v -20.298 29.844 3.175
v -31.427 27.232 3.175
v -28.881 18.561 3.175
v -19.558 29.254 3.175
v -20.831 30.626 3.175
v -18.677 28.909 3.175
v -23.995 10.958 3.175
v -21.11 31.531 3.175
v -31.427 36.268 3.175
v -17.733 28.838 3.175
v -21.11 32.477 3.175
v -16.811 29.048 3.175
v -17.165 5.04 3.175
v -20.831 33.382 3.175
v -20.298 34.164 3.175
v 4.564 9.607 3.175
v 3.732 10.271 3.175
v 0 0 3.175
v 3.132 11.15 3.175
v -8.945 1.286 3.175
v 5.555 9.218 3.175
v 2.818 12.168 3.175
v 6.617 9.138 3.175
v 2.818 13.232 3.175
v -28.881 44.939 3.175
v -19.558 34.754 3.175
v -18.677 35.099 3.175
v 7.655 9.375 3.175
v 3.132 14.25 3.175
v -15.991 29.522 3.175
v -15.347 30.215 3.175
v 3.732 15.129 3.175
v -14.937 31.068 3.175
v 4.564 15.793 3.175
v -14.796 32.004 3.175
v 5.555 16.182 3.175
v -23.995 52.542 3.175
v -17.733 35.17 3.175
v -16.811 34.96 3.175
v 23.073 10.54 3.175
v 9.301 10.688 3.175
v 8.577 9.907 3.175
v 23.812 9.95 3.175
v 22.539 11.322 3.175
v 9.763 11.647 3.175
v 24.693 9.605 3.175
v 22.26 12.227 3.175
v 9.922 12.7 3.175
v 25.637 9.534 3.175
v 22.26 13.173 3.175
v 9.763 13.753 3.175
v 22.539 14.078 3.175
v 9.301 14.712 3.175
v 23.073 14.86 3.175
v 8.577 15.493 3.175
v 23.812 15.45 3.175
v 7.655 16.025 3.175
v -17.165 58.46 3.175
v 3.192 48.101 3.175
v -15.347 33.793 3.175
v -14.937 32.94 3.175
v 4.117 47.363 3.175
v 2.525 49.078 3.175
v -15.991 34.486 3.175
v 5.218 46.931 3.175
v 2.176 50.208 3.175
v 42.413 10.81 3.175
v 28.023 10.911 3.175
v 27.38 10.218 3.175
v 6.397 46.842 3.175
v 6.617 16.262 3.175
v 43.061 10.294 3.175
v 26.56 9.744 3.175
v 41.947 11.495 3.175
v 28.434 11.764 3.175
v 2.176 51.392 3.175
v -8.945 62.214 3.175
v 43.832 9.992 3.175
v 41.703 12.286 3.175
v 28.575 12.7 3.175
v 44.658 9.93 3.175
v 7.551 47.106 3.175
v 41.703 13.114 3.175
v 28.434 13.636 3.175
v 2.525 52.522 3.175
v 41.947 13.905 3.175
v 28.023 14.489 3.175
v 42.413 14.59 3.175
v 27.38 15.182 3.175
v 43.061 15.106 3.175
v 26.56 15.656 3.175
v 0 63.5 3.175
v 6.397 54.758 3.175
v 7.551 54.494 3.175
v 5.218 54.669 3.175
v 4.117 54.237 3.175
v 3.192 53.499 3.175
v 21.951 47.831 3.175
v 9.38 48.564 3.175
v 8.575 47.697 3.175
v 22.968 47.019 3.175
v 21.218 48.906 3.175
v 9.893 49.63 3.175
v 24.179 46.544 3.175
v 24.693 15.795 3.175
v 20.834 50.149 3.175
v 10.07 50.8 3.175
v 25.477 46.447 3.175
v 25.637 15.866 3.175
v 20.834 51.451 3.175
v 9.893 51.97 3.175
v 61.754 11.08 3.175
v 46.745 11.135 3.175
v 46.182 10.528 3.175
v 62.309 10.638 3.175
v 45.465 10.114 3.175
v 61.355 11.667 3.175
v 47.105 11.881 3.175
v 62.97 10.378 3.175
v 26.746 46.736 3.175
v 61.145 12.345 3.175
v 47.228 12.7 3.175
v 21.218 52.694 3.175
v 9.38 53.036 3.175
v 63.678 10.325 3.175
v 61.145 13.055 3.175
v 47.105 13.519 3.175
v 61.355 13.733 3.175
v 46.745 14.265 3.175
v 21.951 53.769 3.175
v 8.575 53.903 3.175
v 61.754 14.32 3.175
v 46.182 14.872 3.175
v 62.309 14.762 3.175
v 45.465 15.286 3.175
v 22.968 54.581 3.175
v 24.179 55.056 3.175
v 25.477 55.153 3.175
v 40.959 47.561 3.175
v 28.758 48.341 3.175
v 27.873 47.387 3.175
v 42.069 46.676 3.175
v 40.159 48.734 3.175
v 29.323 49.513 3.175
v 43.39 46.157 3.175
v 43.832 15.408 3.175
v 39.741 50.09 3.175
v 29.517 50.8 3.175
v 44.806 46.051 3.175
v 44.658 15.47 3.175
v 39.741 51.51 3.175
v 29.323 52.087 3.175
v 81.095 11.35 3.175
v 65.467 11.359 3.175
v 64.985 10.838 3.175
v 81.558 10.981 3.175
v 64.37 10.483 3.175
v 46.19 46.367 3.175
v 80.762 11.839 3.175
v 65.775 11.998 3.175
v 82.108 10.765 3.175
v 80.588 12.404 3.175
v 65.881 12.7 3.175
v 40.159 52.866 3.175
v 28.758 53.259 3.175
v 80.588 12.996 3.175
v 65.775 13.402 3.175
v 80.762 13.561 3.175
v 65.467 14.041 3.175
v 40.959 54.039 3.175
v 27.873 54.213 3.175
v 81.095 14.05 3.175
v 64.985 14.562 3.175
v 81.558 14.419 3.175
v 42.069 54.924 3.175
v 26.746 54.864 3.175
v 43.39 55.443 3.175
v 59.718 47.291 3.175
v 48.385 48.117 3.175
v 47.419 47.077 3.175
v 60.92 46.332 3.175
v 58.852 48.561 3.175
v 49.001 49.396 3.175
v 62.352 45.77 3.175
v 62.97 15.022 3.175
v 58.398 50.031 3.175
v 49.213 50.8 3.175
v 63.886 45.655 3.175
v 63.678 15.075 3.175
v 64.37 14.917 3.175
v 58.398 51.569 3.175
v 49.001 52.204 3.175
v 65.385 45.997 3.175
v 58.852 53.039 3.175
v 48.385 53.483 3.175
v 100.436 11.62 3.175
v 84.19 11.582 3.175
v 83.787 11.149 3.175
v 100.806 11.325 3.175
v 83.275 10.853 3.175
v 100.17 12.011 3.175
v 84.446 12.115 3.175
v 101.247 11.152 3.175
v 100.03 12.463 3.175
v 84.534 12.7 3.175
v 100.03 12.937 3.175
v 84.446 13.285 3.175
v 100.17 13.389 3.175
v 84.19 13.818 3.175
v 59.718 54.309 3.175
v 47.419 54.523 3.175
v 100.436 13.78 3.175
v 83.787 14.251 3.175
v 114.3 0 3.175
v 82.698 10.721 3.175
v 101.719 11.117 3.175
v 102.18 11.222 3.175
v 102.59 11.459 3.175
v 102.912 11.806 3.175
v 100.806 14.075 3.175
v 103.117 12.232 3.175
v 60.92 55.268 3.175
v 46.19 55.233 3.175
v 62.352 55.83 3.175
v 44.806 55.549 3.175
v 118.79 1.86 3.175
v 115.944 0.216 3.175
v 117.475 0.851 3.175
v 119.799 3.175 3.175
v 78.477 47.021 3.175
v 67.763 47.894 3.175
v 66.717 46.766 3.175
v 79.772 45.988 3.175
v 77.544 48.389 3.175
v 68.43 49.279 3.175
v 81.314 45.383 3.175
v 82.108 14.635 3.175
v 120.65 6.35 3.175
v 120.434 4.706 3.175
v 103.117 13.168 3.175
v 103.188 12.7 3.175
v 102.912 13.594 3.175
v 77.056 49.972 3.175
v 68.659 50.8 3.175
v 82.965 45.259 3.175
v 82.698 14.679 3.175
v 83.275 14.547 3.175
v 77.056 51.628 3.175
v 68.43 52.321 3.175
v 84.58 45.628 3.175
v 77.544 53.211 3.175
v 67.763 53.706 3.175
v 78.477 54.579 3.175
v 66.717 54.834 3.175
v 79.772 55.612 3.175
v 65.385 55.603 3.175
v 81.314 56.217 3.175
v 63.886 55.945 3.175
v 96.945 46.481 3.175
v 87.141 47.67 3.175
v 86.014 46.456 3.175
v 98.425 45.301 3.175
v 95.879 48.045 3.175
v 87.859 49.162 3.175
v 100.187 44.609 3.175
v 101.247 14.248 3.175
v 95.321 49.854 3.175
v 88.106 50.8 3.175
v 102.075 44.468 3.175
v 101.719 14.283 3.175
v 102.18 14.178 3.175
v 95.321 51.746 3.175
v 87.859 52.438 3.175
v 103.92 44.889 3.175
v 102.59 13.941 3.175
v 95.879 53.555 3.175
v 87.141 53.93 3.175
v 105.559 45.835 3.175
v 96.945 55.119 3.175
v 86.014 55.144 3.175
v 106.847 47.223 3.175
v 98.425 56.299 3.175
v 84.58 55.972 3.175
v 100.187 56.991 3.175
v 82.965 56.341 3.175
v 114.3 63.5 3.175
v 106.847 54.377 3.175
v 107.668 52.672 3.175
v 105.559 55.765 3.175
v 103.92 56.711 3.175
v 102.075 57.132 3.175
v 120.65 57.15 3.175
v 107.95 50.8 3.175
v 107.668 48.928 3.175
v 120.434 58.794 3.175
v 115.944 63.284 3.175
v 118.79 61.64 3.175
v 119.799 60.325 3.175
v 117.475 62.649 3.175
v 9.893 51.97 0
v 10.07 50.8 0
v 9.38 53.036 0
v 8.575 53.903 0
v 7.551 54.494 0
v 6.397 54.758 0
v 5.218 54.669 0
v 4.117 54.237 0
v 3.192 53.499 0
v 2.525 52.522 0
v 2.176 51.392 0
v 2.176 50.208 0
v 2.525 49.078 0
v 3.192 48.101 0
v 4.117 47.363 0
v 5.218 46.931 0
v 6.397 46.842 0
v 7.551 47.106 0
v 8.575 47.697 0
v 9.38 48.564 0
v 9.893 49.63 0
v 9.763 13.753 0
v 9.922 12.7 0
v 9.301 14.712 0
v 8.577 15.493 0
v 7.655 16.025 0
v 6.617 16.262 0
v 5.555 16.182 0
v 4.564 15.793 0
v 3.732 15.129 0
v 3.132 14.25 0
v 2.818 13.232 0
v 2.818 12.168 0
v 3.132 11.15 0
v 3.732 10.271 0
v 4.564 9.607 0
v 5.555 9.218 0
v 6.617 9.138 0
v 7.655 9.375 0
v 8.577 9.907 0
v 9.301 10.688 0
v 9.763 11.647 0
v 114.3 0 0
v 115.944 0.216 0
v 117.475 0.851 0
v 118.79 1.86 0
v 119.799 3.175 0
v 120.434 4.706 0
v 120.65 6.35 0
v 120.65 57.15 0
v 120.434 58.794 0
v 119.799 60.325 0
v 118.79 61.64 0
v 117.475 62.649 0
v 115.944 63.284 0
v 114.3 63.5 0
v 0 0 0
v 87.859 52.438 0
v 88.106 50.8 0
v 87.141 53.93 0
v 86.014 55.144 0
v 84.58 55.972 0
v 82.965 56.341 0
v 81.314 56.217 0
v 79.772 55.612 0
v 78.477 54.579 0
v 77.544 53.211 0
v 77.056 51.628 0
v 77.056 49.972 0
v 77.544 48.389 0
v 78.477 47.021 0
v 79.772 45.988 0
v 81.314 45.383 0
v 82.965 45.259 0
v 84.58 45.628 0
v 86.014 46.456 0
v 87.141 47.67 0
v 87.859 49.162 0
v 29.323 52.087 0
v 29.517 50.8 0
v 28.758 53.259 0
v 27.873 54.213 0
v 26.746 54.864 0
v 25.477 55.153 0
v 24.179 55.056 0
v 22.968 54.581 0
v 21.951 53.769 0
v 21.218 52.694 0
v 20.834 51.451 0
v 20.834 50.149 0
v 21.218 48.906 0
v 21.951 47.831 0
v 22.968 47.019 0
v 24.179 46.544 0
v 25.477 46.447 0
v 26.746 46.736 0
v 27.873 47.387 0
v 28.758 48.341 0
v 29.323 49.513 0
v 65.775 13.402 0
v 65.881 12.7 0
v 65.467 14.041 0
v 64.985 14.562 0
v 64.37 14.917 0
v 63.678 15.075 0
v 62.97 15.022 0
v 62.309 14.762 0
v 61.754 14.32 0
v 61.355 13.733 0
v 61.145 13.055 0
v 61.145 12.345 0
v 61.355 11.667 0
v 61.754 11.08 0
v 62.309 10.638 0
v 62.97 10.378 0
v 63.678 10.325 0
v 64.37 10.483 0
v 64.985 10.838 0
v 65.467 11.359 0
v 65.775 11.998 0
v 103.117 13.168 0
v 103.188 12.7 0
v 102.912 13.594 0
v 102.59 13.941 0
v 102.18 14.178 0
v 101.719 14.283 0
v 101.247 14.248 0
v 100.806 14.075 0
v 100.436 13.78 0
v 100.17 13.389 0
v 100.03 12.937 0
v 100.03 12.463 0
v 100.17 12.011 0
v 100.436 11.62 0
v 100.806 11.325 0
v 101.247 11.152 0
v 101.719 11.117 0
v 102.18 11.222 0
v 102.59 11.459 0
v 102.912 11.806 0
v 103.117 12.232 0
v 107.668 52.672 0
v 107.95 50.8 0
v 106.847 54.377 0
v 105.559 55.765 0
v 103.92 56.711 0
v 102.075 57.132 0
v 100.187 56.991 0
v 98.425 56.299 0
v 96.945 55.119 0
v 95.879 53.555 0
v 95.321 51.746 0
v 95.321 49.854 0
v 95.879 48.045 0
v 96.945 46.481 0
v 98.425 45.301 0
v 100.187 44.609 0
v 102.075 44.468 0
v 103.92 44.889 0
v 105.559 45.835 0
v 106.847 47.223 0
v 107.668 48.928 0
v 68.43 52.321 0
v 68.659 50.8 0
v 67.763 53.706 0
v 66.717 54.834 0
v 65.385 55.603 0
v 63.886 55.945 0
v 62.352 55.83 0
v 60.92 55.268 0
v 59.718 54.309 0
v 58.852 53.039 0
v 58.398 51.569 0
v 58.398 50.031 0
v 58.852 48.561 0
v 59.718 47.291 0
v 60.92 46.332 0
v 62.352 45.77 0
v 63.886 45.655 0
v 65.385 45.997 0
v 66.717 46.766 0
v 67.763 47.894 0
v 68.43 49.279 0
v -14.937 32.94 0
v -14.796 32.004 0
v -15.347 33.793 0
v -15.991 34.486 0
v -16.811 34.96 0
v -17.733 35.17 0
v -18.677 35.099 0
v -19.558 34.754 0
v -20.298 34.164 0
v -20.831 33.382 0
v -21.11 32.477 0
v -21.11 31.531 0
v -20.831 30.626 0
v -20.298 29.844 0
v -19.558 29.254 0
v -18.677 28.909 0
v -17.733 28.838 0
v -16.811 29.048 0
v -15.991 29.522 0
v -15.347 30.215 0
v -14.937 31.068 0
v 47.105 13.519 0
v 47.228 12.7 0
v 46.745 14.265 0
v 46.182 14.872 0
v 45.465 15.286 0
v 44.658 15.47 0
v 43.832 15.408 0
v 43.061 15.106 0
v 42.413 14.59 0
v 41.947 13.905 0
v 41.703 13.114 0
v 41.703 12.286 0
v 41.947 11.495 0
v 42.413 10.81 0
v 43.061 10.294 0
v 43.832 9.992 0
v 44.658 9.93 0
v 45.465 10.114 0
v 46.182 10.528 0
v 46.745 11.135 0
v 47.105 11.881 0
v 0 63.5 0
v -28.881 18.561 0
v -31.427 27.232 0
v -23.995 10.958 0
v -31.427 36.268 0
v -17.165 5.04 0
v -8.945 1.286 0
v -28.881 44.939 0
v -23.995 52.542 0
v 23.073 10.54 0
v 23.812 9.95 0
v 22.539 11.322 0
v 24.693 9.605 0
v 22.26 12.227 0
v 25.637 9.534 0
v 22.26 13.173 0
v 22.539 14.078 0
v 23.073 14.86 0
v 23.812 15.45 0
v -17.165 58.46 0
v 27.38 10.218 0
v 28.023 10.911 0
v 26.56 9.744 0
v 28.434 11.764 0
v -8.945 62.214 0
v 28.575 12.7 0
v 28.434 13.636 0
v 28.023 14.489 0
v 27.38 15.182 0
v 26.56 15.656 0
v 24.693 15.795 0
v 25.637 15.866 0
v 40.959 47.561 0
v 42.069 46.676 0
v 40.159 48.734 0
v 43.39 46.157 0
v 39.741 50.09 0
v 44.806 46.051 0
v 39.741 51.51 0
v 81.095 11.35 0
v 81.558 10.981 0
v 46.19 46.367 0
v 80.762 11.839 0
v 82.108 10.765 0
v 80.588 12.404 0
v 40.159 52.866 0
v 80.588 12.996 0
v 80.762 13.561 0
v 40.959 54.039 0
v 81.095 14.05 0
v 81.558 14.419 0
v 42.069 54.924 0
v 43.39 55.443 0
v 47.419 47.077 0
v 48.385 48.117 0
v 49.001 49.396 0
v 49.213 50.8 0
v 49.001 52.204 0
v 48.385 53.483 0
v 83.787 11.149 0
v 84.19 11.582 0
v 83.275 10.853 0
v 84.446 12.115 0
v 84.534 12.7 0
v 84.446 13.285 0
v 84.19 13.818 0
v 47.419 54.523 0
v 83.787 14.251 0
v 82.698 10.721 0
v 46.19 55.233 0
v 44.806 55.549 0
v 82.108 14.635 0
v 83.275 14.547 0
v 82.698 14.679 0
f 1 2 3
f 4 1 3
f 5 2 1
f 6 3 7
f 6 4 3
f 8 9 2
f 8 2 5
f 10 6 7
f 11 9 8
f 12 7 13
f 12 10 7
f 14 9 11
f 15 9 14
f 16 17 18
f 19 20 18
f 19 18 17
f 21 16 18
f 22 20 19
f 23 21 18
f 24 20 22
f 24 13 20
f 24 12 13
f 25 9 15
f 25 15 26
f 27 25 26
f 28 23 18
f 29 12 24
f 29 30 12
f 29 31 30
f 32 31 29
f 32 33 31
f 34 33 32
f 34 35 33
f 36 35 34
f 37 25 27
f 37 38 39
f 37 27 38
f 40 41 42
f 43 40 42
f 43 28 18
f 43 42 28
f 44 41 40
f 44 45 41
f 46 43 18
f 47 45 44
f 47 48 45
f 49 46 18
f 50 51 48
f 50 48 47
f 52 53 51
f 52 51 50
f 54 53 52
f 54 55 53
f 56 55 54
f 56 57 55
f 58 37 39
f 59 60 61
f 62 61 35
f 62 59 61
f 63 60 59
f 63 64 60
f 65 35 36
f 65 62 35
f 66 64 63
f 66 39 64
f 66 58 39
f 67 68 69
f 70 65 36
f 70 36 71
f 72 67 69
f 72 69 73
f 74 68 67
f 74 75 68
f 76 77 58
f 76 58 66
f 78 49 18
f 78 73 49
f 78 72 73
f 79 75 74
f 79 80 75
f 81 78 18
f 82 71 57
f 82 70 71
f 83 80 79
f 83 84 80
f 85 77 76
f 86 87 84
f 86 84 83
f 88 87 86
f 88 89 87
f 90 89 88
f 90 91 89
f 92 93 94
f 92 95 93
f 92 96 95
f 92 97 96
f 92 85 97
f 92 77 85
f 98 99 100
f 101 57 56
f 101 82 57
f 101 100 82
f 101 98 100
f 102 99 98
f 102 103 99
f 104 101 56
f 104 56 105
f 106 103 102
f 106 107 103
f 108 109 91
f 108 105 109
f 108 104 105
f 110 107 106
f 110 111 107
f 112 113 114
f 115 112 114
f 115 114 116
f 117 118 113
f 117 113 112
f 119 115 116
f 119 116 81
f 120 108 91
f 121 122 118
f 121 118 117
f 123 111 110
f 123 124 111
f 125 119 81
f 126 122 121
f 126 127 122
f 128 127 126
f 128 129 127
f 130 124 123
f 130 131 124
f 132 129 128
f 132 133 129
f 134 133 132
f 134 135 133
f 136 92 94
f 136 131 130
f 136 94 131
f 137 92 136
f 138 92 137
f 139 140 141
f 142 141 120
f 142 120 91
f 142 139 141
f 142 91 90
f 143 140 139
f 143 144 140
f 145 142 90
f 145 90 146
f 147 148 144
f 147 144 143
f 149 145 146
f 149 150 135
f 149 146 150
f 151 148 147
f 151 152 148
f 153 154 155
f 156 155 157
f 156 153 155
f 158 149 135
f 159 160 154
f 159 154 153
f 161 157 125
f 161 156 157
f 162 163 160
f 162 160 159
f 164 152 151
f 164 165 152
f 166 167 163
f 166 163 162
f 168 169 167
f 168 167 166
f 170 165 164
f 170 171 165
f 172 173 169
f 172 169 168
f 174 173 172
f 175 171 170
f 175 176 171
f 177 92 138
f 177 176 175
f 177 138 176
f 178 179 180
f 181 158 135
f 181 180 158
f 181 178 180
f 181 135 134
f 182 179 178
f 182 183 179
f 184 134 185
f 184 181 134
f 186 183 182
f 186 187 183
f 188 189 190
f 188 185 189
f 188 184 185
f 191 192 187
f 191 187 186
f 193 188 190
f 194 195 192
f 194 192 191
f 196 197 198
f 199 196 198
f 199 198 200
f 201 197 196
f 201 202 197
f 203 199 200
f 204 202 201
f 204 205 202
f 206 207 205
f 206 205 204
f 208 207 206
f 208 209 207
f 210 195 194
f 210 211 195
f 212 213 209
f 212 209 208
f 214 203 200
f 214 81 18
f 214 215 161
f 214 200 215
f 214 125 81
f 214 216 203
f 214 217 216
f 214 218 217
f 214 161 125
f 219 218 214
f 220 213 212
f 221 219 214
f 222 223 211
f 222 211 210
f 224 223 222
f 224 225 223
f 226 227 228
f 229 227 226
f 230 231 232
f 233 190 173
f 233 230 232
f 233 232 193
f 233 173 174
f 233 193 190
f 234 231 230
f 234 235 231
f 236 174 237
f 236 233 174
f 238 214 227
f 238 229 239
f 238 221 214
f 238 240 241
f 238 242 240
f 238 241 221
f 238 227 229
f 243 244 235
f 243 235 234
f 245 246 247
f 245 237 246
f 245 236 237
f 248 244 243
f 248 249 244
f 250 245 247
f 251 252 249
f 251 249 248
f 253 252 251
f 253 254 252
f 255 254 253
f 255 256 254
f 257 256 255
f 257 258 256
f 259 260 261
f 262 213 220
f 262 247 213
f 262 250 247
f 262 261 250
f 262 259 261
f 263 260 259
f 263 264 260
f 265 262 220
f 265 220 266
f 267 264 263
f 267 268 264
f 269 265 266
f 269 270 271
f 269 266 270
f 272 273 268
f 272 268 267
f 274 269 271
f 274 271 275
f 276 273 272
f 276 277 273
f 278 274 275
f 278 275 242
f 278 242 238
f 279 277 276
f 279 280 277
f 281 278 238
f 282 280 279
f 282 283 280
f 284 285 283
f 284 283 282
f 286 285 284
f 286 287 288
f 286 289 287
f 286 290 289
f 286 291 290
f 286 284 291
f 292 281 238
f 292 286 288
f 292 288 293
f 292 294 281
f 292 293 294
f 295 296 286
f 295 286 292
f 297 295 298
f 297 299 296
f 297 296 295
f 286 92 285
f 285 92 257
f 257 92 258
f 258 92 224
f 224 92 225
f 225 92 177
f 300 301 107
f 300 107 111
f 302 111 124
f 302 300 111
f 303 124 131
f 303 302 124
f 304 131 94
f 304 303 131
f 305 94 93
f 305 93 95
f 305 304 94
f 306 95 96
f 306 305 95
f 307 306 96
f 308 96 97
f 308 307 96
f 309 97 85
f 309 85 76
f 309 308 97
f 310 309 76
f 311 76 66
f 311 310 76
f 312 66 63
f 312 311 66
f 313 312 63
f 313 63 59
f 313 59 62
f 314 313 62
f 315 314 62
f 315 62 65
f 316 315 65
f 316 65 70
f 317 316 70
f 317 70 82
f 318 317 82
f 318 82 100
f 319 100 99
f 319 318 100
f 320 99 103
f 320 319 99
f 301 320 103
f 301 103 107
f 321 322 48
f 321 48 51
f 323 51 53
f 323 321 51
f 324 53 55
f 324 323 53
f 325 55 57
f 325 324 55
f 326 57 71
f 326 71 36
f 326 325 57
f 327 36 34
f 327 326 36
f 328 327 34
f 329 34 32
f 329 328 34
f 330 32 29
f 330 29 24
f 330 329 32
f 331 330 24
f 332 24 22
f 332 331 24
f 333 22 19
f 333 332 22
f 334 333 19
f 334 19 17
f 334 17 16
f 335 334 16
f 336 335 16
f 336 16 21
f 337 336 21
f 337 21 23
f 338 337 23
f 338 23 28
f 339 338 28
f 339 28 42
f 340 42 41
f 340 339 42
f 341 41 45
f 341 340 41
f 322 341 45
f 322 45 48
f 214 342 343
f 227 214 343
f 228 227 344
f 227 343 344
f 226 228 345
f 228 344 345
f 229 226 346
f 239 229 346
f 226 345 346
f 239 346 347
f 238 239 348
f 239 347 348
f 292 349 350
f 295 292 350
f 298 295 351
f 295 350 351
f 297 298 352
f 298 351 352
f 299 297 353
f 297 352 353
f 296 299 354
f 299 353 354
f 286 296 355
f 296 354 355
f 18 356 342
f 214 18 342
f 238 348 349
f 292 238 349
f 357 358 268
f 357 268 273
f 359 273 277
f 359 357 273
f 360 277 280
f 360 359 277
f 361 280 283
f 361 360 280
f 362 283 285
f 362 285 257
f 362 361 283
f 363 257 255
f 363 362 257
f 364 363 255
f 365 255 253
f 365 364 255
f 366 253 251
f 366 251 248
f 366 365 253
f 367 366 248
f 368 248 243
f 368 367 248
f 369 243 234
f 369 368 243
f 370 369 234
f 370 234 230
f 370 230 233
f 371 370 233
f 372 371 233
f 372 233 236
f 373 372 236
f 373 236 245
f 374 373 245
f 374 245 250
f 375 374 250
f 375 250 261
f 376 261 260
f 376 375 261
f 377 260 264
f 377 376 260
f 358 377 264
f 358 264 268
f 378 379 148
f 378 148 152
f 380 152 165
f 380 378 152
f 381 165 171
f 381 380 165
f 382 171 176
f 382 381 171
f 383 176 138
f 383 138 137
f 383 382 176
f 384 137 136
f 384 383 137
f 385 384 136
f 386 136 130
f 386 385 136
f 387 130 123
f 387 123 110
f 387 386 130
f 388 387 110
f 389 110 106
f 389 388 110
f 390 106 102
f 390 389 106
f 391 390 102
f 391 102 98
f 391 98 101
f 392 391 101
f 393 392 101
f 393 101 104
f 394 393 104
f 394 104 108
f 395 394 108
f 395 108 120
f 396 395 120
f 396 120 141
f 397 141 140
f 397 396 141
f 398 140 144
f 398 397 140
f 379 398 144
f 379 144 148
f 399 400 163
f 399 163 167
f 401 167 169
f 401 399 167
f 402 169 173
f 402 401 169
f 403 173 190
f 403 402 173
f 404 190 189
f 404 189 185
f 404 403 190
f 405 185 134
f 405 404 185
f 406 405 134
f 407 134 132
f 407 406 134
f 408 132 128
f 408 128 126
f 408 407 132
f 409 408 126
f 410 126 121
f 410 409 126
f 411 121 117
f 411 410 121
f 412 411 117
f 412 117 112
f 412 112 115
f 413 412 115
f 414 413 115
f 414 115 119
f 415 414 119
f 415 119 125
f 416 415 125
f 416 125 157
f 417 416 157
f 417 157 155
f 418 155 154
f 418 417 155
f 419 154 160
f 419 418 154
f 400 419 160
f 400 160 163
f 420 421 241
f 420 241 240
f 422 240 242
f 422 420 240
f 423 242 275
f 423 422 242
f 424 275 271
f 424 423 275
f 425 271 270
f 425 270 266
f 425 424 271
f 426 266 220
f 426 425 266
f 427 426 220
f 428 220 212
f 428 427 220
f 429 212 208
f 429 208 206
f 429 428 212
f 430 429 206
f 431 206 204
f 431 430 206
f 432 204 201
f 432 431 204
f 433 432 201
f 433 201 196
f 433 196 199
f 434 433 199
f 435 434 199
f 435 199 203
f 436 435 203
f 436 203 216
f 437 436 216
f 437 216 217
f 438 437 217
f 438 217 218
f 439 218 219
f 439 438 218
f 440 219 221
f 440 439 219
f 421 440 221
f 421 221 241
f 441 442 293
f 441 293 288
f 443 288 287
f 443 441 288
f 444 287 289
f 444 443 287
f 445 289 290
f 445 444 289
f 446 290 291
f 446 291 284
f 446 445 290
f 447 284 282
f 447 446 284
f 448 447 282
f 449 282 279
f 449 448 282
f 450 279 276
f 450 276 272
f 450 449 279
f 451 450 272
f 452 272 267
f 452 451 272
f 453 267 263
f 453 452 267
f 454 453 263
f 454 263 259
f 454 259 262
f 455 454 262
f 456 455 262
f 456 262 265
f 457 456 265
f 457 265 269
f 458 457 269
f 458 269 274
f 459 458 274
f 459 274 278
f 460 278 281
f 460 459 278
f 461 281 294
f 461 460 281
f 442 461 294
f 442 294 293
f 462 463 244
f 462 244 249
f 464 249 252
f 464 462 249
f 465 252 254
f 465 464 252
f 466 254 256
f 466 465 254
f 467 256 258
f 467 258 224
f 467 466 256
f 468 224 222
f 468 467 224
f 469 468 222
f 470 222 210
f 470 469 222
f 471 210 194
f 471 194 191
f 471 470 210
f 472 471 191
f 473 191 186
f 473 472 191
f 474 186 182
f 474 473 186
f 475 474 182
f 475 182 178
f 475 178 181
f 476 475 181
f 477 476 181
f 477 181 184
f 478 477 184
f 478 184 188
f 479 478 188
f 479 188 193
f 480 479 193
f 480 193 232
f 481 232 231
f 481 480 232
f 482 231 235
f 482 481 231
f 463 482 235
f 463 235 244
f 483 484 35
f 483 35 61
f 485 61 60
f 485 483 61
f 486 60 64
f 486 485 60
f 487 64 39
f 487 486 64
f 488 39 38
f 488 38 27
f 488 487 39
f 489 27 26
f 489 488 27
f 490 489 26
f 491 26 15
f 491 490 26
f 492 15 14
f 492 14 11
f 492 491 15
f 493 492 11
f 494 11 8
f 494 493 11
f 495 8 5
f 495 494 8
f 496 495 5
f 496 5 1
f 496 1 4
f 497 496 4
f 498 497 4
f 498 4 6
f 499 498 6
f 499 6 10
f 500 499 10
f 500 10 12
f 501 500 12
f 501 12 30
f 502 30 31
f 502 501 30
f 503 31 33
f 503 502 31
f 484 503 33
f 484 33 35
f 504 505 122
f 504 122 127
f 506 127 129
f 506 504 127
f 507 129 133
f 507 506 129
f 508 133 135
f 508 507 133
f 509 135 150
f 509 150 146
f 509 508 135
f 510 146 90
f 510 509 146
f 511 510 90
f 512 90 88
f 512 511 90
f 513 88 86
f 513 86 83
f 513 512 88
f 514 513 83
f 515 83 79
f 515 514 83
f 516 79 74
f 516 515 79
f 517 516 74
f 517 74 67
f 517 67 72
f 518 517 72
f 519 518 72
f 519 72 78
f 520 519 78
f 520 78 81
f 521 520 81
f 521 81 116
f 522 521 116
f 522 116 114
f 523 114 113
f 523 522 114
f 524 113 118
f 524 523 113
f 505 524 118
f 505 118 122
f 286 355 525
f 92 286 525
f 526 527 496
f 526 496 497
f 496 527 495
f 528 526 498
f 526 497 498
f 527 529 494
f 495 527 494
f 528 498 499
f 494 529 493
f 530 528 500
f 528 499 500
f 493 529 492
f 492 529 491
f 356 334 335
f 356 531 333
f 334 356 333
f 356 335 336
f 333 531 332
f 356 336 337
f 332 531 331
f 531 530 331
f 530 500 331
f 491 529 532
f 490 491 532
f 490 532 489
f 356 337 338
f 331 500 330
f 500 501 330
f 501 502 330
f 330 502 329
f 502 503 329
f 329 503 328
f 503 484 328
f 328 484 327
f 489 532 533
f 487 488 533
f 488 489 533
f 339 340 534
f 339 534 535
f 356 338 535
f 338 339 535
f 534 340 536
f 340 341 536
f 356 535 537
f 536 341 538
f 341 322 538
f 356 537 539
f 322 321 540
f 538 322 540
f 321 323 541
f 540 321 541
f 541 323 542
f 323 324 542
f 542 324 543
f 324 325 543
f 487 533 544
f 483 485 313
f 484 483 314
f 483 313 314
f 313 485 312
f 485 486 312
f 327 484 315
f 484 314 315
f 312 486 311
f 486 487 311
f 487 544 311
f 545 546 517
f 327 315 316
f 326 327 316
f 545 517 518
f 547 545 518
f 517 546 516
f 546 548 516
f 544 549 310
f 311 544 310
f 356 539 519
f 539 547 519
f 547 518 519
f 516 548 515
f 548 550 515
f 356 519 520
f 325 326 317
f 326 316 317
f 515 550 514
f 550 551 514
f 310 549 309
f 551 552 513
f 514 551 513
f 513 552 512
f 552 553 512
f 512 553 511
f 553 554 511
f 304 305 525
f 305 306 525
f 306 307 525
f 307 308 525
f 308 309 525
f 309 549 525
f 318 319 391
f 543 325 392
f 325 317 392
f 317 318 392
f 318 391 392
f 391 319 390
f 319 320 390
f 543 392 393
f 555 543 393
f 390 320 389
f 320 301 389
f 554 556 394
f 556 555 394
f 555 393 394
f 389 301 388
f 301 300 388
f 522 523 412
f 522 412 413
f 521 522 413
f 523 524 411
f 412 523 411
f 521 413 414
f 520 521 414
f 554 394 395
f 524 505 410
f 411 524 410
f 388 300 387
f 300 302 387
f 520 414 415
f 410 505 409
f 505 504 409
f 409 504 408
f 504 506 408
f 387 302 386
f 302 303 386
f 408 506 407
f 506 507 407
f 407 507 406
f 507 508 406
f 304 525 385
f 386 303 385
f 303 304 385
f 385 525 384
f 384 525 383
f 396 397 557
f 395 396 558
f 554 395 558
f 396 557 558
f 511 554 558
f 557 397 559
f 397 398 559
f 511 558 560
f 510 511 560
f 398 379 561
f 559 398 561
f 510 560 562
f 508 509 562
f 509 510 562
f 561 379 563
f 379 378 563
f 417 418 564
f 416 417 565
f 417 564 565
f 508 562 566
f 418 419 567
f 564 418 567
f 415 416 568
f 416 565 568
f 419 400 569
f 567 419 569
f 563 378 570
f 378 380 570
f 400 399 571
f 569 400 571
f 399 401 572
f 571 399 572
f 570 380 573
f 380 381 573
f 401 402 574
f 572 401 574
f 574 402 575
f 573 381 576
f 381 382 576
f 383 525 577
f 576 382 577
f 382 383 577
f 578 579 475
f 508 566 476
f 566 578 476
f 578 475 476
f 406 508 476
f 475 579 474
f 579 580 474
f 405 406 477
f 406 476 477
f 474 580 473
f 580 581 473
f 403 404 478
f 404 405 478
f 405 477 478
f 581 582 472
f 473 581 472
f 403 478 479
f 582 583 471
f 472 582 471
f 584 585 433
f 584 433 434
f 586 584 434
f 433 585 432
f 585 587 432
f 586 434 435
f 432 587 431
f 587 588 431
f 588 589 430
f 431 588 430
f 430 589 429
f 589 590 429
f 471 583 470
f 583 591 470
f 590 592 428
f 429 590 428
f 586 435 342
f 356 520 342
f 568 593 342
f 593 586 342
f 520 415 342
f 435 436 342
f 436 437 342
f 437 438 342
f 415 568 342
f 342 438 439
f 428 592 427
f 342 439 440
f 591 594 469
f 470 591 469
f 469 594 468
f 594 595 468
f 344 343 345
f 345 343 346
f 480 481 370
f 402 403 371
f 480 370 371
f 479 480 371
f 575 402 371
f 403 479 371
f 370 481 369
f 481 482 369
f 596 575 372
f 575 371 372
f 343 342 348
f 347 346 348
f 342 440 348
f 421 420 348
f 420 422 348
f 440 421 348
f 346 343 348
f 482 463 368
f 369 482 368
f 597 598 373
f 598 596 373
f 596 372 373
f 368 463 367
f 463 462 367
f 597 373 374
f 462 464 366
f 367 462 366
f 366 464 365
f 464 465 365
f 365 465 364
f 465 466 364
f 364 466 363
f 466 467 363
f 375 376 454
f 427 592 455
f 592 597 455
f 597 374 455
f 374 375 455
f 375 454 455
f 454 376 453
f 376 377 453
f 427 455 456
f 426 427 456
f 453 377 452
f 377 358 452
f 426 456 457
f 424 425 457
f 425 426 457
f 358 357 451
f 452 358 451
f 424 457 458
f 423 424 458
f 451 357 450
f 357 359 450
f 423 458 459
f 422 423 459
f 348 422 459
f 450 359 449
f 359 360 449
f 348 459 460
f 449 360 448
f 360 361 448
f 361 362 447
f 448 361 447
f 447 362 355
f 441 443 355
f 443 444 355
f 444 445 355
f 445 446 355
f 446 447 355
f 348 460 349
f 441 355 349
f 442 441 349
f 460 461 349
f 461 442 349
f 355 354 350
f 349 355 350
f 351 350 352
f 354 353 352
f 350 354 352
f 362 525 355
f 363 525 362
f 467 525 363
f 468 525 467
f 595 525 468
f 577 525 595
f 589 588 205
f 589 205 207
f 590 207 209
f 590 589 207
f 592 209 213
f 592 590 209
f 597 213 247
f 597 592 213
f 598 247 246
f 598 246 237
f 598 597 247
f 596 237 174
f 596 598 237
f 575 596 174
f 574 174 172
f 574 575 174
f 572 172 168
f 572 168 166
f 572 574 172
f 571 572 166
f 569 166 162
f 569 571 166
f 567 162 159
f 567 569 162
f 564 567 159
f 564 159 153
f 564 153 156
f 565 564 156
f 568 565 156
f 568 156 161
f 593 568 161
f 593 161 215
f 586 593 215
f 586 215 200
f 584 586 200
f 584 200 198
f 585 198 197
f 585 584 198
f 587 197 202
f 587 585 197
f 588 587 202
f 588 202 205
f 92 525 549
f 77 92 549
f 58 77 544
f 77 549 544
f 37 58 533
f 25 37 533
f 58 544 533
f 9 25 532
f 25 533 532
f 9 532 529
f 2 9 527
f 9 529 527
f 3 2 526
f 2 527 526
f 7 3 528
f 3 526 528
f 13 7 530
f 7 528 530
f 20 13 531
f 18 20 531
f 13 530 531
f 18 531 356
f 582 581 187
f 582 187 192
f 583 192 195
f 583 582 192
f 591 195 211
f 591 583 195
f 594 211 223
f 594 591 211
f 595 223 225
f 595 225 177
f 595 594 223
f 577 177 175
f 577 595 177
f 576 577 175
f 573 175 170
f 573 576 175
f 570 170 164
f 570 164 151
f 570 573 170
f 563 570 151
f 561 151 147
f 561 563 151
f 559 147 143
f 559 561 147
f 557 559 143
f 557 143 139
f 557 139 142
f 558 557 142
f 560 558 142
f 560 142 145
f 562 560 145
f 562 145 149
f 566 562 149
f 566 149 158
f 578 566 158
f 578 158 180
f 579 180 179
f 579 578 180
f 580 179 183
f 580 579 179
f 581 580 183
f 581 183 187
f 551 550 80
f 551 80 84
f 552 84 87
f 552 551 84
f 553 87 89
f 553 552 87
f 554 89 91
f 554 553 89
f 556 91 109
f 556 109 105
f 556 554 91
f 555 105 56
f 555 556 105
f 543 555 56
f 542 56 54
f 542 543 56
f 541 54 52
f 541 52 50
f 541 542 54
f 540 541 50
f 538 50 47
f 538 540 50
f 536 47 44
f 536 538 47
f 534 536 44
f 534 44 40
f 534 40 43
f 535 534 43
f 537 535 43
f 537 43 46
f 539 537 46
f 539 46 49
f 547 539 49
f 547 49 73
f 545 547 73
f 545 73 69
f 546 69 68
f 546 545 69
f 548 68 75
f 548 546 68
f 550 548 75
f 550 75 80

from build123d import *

# Parameters (mm, degrees)
F0_R     = 3.175
F0_R_2   = 3.571875
F0_R_3   = 3.96875
F0_R_4   = 4.365625
F0_R_5   = 2.778125
F0_R_6   = 2.38125
F0_R_7   = 4.7625
F0_R_8   = 5.159375
F0_R_9   = 1.984375
F0_R_10  = 1.5875
F0_R_11  = 5.55625
F0_R_12  = 6.35
F1_DEPTH = 3.175


with BuildPart() as f1:
    # F0 (on Top) → F1 (new body)
    with BuildSketch(Plane.XY):
        with BuildLine():
            ThreePointArc((0, 63.5), (-31.75, 31.75), (0, 0))
            Line((0, 0), (114.3, 0))
            ThreePointArc((114.3, 0), (118.790128, 1.859872), (120.65, 6.35))
            Line((120.65, 6.35), (120.65, 57.15))
            ThreePointArc((120.65, 57.15), (118.790128, 61.640128), (114.3, 63.5))
            Line((114.3, 63.5), (0, 63.5))
        make_face()
        with Locations((-17.970501, 32.004002)):
            Circle(F0_R, mode=Mode.SUBTRACT)
        with Locations((6.35, 12.7)):
            Circle(F0_R_2, mode=Mode.SUBTRACT)
        with Locations((6.100903, 50.8)):
            Circle(F0_R_3, mode=Mode.SUBTRACT)
        with Locations((25.150903, 50.8)):
            Circle(F0_R_4, mode=Mode.SUBTRACT)
        with Locations((25.4, 12.7)):
            Circle(F0_R, mode=Mode.SUBTRACT)
        with Locations((44.45, 12.7)):
            Circle(F0_R_5, mode=Mode.SUBTRACT)
        with Locations((63.5, 12.7)):
            Circle(F0_R_6, mode=Mode.SUBTRACT)
        with Locations((44.45, 50.8)):
            Circle(F0_R_7, mode=Mode.SUBTRACT)
        with Locations((63.5, 50.8)):
            Circle(F0_R_8, mode=Mode.SUBTRACT)
        with Locations((82.55, 12.7)):
            Circle(F0_R_9, mode=Mode.SUBTRACT)
        with Locations((101.6, 12.7)):
            Circle(F0_R_10, mode=Mode.SUBTRACT)
        with Locations((82.55, 50.8)):
            Circle(F0_R_11, mode=Mode.SUBTRACT)
        with Locations((101.6, 50.8)):
            Circle(F0_R_12, mode=Mode.SUBTRACT)
    extrude(amount=F1_DEPTH)


solid = f1.part
